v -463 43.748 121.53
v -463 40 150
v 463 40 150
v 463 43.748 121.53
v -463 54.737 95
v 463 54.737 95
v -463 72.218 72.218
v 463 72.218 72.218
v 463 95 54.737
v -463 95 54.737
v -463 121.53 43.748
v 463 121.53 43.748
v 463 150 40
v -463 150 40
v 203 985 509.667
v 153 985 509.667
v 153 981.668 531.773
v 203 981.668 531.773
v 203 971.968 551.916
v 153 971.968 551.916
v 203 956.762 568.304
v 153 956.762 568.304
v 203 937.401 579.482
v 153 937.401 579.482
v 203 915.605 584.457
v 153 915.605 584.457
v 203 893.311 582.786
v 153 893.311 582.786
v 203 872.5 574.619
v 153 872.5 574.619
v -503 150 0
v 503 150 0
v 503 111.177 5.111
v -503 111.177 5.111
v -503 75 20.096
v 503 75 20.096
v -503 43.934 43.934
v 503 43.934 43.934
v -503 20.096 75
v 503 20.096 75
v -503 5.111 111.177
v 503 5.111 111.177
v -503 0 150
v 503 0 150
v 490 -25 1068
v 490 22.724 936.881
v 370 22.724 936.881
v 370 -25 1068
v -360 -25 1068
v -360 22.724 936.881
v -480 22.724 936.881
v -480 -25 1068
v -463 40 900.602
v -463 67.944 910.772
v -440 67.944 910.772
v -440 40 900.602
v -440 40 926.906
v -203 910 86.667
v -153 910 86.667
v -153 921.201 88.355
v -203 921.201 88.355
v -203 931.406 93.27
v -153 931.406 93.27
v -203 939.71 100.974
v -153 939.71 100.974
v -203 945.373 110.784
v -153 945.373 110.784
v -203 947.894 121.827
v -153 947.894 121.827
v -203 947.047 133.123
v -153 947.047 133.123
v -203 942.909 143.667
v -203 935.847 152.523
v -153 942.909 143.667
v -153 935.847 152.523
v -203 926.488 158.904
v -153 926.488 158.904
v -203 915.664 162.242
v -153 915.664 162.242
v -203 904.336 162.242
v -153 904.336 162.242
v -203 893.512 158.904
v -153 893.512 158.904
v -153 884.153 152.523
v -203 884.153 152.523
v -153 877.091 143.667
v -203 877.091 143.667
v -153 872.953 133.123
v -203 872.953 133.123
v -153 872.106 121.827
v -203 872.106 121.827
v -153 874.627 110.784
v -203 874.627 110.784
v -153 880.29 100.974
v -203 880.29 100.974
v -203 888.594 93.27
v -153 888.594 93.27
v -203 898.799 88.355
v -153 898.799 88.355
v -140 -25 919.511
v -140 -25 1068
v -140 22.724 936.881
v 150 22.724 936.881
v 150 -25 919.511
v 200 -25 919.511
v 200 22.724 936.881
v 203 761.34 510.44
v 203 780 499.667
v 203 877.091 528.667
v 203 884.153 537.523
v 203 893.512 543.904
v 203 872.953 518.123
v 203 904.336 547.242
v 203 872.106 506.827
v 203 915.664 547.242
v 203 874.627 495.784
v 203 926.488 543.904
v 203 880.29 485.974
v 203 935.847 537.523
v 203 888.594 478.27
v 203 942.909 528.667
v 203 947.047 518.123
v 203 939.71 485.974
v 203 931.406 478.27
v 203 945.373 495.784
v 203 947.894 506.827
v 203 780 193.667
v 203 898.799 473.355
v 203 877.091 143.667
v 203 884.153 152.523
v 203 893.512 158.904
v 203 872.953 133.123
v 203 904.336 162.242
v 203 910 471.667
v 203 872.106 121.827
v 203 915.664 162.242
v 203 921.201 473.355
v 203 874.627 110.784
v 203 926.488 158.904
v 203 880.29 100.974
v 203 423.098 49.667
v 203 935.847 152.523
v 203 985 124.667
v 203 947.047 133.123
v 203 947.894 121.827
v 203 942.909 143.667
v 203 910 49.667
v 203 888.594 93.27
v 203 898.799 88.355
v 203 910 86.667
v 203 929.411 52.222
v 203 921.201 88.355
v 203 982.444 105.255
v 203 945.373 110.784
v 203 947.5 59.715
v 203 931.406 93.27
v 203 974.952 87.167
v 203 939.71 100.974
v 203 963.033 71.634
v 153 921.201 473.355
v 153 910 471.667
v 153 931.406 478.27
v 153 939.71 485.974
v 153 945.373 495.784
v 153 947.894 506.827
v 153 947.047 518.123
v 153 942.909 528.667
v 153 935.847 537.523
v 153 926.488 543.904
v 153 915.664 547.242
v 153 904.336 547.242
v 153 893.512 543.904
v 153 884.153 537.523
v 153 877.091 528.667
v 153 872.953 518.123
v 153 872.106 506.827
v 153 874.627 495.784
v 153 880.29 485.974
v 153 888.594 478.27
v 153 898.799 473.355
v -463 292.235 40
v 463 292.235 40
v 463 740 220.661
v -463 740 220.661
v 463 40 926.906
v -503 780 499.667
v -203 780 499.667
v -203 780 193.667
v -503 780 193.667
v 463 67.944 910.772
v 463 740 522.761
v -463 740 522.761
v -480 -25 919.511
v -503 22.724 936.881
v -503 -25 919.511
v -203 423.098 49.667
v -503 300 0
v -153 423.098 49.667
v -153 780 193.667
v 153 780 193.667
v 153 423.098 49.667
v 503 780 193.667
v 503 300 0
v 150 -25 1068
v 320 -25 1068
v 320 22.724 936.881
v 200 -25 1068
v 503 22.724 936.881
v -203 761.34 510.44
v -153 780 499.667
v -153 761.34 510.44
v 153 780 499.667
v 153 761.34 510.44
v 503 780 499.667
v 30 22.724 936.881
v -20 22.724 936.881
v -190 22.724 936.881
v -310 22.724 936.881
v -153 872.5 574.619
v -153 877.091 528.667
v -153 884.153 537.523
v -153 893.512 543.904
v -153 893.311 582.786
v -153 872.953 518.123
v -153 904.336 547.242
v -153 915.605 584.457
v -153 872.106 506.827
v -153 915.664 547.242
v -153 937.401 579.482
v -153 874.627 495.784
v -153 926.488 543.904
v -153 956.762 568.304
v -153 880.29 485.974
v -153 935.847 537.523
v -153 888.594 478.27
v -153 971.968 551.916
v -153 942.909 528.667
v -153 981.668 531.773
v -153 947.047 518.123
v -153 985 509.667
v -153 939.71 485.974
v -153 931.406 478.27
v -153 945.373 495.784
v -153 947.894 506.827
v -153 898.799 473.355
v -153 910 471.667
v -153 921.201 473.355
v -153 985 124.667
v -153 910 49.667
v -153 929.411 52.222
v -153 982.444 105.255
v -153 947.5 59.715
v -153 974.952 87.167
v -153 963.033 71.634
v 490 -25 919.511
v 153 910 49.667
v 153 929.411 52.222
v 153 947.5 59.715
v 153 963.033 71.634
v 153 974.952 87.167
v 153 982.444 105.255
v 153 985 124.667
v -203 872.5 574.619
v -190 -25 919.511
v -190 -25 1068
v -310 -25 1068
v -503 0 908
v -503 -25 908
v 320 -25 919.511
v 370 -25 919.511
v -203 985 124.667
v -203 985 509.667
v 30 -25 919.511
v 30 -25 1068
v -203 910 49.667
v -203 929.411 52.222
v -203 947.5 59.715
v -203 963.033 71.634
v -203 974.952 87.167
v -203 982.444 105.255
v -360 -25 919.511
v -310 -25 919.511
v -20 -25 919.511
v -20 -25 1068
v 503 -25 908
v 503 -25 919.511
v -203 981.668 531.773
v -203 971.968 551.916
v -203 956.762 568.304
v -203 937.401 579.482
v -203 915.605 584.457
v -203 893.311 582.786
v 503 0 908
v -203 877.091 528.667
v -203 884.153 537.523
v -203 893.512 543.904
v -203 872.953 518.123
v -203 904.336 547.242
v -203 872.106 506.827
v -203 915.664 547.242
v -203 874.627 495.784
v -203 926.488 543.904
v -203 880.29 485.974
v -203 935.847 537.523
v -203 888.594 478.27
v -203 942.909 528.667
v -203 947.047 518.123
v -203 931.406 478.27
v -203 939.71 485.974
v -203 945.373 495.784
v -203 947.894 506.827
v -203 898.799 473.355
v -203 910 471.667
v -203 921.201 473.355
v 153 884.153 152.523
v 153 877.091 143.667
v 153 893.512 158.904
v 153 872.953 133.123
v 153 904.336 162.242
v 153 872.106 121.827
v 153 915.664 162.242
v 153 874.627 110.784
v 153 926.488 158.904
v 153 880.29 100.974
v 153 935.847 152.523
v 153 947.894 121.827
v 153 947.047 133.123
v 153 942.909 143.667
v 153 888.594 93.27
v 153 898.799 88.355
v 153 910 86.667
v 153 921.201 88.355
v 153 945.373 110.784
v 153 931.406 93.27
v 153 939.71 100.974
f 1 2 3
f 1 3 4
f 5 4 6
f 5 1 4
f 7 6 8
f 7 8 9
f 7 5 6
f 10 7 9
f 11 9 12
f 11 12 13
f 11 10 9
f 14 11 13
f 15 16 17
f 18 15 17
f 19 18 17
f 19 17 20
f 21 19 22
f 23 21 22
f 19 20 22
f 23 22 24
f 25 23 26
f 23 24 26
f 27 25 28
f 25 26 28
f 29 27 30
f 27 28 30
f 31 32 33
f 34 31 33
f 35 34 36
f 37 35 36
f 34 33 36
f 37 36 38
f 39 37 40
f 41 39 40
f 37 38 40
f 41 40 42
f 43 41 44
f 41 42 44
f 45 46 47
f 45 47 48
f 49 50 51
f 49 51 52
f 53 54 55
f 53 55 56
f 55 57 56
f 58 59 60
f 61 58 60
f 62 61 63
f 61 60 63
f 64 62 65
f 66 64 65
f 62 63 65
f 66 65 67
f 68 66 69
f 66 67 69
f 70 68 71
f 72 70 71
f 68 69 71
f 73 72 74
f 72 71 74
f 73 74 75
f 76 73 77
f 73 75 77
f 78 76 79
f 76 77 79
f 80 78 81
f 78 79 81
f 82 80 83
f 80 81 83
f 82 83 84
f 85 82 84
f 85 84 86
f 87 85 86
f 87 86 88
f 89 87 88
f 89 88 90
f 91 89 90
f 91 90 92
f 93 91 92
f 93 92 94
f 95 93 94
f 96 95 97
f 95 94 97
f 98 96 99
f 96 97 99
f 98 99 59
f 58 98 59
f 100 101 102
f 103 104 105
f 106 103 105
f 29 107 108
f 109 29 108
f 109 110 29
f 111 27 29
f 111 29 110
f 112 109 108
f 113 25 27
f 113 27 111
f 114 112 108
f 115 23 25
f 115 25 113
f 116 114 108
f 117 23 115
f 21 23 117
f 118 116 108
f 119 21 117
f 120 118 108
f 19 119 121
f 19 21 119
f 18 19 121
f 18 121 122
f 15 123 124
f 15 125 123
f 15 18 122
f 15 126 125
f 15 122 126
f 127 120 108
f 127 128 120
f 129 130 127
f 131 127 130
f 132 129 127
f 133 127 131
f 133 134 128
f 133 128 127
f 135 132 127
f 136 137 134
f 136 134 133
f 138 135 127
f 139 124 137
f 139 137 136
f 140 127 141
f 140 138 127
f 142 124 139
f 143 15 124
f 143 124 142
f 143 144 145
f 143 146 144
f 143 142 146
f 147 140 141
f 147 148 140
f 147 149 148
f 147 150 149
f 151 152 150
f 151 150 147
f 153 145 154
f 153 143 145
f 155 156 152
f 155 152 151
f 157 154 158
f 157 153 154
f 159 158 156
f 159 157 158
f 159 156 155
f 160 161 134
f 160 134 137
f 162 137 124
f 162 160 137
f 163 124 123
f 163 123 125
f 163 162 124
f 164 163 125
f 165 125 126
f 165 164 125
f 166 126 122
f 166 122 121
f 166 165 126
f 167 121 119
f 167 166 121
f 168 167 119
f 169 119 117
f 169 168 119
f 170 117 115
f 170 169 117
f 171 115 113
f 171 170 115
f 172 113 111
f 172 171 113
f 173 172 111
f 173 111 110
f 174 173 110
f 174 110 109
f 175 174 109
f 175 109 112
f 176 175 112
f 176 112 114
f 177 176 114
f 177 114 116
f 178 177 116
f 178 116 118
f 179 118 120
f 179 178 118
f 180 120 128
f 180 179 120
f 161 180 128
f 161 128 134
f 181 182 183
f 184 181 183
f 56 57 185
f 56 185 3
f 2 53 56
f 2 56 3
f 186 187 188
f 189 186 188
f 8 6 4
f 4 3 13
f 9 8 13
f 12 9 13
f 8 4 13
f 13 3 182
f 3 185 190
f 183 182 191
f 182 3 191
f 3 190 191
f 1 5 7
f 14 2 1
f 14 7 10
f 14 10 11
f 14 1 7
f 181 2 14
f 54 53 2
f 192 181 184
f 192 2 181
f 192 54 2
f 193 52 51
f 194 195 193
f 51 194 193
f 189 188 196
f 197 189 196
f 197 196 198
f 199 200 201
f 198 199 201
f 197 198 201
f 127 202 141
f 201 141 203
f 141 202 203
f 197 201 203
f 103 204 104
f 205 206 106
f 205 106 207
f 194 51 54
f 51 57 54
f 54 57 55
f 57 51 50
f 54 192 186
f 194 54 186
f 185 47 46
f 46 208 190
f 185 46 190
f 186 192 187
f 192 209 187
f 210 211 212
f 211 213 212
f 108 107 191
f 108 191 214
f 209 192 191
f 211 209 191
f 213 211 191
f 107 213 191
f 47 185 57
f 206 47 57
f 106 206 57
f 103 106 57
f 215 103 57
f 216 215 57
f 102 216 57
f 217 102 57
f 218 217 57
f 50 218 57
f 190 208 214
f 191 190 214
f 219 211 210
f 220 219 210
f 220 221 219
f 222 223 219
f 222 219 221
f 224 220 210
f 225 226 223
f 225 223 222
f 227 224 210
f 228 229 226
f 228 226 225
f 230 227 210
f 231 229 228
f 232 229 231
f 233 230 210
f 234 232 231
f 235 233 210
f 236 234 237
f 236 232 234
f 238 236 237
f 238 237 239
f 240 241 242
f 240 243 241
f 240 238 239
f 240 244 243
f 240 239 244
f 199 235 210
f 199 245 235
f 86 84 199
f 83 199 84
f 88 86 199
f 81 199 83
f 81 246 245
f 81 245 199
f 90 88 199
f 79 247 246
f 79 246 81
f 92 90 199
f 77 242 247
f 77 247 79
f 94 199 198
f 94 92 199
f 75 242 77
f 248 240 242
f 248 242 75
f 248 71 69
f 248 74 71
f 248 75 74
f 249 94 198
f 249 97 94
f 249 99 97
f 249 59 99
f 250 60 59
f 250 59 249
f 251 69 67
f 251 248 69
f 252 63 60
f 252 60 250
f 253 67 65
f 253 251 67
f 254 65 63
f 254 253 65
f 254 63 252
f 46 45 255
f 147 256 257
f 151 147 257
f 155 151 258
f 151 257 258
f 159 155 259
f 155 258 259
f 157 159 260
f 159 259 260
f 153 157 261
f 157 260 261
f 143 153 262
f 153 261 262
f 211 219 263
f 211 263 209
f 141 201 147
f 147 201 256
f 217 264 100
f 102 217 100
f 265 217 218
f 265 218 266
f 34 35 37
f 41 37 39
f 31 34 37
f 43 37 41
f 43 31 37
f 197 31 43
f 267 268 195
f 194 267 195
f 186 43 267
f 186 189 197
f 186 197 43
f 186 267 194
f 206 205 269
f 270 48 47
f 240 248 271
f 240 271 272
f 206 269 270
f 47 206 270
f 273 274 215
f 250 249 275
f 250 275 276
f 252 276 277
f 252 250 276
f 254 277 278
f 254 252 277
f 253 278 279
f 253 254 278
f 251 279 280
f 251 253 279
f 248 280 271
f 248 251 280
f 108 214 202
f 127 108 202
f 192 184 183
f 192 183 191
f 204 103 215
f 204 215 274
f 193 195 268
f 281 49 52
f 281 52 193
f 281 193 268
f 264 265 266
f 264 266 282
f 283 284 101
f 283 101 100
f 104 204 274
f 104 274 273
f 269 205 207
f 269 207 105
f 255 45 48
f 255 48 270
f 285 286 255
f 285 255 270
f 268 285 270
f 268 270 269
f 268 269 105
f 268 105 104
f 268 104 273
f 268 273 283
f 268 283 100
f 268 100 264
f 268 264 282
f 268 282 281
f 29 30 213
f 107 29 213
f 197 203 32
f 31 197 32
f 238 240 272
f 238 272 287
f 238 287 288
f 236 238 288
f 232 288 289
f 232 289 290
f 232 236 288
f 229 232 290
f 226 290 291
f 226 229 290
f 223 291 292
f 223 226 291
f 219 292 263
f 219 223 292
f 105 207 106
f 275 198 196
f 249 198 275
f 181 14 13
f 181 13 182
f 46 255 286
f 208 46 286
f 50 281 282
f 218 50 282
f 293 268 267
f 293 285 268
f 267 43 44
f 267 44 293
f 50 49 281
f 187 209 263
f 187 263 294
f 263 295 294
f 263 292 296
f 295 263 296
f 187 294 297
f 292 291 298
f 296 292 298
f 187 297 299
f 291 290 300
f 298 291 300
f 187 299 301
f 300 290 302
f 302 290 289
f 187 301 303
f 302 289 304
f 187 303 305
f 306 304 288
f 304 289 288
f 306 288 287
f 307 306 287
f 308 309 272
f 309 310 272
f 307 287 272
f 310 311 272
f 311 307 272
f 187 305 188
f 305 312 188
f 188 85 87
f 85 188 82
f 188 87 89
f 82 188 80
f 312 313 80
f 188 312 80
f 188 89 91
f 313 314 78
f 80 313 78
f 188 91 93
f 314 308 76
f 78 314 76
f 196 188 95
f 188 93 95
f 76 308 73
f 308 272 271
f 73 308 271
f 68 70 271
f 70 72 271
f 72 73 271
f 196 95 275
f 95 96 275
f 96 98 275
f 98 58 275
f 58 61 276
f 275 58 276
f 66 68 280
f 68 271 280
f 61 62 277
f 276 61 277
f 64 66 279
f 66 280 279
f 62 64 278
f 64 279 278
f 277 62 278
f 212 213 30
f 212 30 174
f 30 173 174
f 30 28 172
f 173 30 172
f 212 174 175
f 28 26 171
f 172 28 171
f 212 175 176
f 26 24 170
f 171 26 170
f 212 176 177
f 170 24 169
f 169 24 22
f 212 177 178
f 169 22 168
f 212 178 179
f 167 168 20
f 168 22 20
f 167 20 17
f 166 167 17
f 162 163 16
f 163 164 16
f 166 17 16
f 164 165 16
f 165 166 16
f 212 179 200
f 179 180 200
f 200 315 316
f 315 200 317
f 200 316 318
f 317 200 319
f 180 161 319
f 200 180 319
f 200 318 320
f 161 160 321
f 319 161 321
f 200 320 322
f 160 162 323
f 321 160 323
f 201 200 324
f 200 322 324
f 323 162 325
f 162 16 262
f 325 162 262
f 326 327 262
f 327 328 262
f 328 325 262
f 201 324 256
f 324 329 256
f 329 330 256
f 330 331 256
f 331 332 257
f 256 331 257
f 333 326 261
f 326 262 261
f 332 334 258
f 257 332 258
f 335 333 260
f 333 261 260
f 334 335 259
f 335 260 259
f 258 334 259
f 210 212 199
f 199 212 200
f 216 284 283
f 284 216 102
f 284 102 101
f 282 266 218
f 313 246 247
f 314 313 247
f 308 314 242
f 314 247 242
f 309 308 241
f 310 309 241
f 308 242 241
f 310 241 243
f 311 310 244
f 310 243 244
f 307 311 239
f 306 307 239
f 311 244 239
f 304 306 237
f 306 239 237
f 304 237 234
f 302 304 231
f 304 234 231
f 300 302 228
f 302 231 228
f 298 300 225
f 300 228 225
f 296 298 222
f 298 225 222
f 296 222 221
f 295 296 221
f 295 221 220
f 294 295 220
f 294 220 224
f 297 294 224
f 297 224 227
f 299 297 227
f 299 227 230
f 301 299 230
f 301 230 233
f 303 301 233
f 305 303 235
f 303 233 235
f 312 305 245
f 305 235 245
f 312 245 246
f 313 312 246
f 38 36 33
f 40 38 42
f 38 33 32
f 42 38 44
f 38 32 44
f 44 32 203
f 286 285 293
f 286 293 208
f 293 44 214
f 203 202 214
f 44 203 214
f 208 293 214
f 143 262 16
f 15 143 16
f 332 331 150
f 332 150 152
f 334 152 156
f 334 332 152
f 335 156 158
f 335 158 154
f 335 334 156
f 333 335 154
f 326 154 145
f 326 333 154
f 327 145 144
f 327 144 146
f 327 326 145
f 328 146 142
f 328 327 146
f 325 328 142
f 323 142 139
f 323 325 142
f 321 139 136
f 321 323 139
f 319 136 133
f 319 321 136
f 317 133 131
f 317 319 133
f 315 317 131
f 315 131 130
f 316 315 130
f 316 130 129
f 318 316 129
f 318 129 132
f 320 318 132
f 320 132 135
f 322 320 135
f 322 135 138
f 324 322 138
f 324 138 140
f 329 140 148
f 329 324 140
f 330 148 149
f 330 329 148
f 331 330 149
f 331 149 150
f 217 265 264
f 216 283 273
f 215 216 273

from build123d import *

# Parameters (mm, degrees)
BOSS_EXTRUDE1_DEPTH = 503
SKETCH2_W           = 23
SKETCH2_H           = 139.534422093
SKETCH2_W_2         = 50
SKETCH2_W_3         = 13
CUT_EXTRUDE1_DEPTH  = 1170.669741252
SHELL1_START        = -463
SHELL1_DEPTH        = 926
SHELL1_START_2      = -440
SHELL1_2_DEPTH      = 903
BOSS_EXTRUDE2_START = 153
SKETCH4_R           = 38
BOSS_EXTRUDE2_DEPTH = 50


# Read off the part's stored shape, not the designer's step: Shell1
with BuildPart() as part:
    # Sketch1 → Boss-Extrude1 (new, symmetric)
    with BuildSketch(Plane(origin=(0, 0, 0), x_dir=(0, 0, -1), z_dir=(1, 0, 0))):
        with BuildLine():
            Line((-150, 0), (-950, 0))
            Line((-950, 0), (-499.666790032, 780))
            Line((-499.666790032, 780), (-193.666790032, 780))
            Line((-193.666790032, 780), (0, 300))
            Line((0, 300), (0, 150))
            ThreePointArc((0, 150), (-43.933982822, 43.933982822), (-150, 0))
        make_face()
        Polygon((-908, -25), (-908, 0), (-950, 0), (-936.880533213, 22.723583043), (-1068, -25), align=None)
    extrude(amount=BOSS_EXTRUDE1_DEPTH, both=True)

    # Sketch2 → Cut-Extrude1 (cut, through all)
    with BuildSketch(Plane(origin=(0, 321.173028034, 116.897422253), x_dir=(1, 0, 0), z_dir=(0, 0.9396926207859103, 0.34202014332566333))):
        with Locations((-491.5, -942.375011536)):
            Rectangle(SKETCH2_W, SKETCH2_H)
        with Locations((-335, -942.375011536)):
            Rectangle(SKETCH2_W_2, SKETCH2_H)
        with Locations((-165, -942.375011536)):
            Rectangle(SKETCH2_W_2, SKETCH2_H)
        with Locations((5, -942.375011536)):
            Rectangle(SKETCH2_W_2, SKETCH2_H)
        with Locations((175, -942.375011536)):
            Rectangle(SKETCH2_W_2, SKETCH2_H)
        with Locations((345, -942.375011536)):
            Rectangle(SKETCH2_W_2, SKETCH2_H)
        with Locations((496.5, -942.375011536)):
            Rectangle(SKETCH2_W_3, SKETCH2_H)
    extrude(amount=-CUT_EXTRUDE1_DEPTH, mode=Mode.SUBTRACT)

    # Shell1 outline → Shell1 (cut)
    with BuildSketch(Plane.YZ.offset(SHELL1_START)):
        with BuildLine():
            Line((67.944218037, 910.772387426), (40, 900.601523841))
            Line((40, 900.601523841), (40, 150))
            ThreePointArc((40, 150), (72.218254069, 72.218254069), (150, 40))
            Line((150, 40), (292.234669594, 40))
            Line((292.234669594, 40), (740, 220.660987974))
            Line((740, 220.660987974), (740, 522.7608008))
            Line((740, 522.7608008), (67.944218037, 910.772387426))
        make_face()
    extrude(amount=SHELL1_DEPTH, mode=Mode.SUBTRACT)

    # Shell1 2 outline → Shell1 2 (cut)
    with BuildSketch(Plane.YZ.offset(SHELL1_START_2)):
        Polygon((67.944218037, 910.772387426), (40, 926.905989232), (40, 900.601523841), align=None)
    extrude(amount=SHELL1_2_DEPTH, mode=Mode.SUBTRACT)

    # Sketch4 → Boss-Extrude2 (add)
    with BuildSketch(Plane(origin=(0, 0, 0), x_dir=(0, 0, -1), z_dir=(1, 0, 0)).offset(BOSS_EXTRUDE2_START)):
        with BuildLine():
            Line((-49.666790032, 423.098334058), (-49.666790032, 910))
            ThreePointArc((-49.666790032, 910), (-71.633781443, 963.033008589), (-124.666790032, 985))
            Line((-124.666790032, 985), (-509.666790032, 985))
            ThreePointArc((-509.666790032, 985), (-574.618695316, 947.5), (-574.618695316, 872.5))
            Line((-574.618695316, 872.5), (-510.440292724, 761.339745962))
            Line((-510.440292724, 761.339745962), (-499.666790032, 780))
            Line((-499.666790032, 780), (-193.666790032, 780))
            Line((-193.666790032, 780), (-49.666790032, 423.098334058))
        make_face()
        with Locations((-509.666790032, 910)):
            Circle(SKETCH4_R, mode=Mode.SUBTRACT)
        with Locations((-124.666790032, 910)):
            Circle(SKETCH4_R, mode=Mode.SUBTRACT)
    boss_extrude2 = extrude(amount=BOSS_EXTRUDE2_DEPTH)

    # Mirror1: Boss-Extrude2 across plane
    add(boss_extrude2.mirror(Plane(origin=(0, 0, 0), x_dir=(0, 0, 1), z_dir=(1, 0, 0))))


solid = part.part
